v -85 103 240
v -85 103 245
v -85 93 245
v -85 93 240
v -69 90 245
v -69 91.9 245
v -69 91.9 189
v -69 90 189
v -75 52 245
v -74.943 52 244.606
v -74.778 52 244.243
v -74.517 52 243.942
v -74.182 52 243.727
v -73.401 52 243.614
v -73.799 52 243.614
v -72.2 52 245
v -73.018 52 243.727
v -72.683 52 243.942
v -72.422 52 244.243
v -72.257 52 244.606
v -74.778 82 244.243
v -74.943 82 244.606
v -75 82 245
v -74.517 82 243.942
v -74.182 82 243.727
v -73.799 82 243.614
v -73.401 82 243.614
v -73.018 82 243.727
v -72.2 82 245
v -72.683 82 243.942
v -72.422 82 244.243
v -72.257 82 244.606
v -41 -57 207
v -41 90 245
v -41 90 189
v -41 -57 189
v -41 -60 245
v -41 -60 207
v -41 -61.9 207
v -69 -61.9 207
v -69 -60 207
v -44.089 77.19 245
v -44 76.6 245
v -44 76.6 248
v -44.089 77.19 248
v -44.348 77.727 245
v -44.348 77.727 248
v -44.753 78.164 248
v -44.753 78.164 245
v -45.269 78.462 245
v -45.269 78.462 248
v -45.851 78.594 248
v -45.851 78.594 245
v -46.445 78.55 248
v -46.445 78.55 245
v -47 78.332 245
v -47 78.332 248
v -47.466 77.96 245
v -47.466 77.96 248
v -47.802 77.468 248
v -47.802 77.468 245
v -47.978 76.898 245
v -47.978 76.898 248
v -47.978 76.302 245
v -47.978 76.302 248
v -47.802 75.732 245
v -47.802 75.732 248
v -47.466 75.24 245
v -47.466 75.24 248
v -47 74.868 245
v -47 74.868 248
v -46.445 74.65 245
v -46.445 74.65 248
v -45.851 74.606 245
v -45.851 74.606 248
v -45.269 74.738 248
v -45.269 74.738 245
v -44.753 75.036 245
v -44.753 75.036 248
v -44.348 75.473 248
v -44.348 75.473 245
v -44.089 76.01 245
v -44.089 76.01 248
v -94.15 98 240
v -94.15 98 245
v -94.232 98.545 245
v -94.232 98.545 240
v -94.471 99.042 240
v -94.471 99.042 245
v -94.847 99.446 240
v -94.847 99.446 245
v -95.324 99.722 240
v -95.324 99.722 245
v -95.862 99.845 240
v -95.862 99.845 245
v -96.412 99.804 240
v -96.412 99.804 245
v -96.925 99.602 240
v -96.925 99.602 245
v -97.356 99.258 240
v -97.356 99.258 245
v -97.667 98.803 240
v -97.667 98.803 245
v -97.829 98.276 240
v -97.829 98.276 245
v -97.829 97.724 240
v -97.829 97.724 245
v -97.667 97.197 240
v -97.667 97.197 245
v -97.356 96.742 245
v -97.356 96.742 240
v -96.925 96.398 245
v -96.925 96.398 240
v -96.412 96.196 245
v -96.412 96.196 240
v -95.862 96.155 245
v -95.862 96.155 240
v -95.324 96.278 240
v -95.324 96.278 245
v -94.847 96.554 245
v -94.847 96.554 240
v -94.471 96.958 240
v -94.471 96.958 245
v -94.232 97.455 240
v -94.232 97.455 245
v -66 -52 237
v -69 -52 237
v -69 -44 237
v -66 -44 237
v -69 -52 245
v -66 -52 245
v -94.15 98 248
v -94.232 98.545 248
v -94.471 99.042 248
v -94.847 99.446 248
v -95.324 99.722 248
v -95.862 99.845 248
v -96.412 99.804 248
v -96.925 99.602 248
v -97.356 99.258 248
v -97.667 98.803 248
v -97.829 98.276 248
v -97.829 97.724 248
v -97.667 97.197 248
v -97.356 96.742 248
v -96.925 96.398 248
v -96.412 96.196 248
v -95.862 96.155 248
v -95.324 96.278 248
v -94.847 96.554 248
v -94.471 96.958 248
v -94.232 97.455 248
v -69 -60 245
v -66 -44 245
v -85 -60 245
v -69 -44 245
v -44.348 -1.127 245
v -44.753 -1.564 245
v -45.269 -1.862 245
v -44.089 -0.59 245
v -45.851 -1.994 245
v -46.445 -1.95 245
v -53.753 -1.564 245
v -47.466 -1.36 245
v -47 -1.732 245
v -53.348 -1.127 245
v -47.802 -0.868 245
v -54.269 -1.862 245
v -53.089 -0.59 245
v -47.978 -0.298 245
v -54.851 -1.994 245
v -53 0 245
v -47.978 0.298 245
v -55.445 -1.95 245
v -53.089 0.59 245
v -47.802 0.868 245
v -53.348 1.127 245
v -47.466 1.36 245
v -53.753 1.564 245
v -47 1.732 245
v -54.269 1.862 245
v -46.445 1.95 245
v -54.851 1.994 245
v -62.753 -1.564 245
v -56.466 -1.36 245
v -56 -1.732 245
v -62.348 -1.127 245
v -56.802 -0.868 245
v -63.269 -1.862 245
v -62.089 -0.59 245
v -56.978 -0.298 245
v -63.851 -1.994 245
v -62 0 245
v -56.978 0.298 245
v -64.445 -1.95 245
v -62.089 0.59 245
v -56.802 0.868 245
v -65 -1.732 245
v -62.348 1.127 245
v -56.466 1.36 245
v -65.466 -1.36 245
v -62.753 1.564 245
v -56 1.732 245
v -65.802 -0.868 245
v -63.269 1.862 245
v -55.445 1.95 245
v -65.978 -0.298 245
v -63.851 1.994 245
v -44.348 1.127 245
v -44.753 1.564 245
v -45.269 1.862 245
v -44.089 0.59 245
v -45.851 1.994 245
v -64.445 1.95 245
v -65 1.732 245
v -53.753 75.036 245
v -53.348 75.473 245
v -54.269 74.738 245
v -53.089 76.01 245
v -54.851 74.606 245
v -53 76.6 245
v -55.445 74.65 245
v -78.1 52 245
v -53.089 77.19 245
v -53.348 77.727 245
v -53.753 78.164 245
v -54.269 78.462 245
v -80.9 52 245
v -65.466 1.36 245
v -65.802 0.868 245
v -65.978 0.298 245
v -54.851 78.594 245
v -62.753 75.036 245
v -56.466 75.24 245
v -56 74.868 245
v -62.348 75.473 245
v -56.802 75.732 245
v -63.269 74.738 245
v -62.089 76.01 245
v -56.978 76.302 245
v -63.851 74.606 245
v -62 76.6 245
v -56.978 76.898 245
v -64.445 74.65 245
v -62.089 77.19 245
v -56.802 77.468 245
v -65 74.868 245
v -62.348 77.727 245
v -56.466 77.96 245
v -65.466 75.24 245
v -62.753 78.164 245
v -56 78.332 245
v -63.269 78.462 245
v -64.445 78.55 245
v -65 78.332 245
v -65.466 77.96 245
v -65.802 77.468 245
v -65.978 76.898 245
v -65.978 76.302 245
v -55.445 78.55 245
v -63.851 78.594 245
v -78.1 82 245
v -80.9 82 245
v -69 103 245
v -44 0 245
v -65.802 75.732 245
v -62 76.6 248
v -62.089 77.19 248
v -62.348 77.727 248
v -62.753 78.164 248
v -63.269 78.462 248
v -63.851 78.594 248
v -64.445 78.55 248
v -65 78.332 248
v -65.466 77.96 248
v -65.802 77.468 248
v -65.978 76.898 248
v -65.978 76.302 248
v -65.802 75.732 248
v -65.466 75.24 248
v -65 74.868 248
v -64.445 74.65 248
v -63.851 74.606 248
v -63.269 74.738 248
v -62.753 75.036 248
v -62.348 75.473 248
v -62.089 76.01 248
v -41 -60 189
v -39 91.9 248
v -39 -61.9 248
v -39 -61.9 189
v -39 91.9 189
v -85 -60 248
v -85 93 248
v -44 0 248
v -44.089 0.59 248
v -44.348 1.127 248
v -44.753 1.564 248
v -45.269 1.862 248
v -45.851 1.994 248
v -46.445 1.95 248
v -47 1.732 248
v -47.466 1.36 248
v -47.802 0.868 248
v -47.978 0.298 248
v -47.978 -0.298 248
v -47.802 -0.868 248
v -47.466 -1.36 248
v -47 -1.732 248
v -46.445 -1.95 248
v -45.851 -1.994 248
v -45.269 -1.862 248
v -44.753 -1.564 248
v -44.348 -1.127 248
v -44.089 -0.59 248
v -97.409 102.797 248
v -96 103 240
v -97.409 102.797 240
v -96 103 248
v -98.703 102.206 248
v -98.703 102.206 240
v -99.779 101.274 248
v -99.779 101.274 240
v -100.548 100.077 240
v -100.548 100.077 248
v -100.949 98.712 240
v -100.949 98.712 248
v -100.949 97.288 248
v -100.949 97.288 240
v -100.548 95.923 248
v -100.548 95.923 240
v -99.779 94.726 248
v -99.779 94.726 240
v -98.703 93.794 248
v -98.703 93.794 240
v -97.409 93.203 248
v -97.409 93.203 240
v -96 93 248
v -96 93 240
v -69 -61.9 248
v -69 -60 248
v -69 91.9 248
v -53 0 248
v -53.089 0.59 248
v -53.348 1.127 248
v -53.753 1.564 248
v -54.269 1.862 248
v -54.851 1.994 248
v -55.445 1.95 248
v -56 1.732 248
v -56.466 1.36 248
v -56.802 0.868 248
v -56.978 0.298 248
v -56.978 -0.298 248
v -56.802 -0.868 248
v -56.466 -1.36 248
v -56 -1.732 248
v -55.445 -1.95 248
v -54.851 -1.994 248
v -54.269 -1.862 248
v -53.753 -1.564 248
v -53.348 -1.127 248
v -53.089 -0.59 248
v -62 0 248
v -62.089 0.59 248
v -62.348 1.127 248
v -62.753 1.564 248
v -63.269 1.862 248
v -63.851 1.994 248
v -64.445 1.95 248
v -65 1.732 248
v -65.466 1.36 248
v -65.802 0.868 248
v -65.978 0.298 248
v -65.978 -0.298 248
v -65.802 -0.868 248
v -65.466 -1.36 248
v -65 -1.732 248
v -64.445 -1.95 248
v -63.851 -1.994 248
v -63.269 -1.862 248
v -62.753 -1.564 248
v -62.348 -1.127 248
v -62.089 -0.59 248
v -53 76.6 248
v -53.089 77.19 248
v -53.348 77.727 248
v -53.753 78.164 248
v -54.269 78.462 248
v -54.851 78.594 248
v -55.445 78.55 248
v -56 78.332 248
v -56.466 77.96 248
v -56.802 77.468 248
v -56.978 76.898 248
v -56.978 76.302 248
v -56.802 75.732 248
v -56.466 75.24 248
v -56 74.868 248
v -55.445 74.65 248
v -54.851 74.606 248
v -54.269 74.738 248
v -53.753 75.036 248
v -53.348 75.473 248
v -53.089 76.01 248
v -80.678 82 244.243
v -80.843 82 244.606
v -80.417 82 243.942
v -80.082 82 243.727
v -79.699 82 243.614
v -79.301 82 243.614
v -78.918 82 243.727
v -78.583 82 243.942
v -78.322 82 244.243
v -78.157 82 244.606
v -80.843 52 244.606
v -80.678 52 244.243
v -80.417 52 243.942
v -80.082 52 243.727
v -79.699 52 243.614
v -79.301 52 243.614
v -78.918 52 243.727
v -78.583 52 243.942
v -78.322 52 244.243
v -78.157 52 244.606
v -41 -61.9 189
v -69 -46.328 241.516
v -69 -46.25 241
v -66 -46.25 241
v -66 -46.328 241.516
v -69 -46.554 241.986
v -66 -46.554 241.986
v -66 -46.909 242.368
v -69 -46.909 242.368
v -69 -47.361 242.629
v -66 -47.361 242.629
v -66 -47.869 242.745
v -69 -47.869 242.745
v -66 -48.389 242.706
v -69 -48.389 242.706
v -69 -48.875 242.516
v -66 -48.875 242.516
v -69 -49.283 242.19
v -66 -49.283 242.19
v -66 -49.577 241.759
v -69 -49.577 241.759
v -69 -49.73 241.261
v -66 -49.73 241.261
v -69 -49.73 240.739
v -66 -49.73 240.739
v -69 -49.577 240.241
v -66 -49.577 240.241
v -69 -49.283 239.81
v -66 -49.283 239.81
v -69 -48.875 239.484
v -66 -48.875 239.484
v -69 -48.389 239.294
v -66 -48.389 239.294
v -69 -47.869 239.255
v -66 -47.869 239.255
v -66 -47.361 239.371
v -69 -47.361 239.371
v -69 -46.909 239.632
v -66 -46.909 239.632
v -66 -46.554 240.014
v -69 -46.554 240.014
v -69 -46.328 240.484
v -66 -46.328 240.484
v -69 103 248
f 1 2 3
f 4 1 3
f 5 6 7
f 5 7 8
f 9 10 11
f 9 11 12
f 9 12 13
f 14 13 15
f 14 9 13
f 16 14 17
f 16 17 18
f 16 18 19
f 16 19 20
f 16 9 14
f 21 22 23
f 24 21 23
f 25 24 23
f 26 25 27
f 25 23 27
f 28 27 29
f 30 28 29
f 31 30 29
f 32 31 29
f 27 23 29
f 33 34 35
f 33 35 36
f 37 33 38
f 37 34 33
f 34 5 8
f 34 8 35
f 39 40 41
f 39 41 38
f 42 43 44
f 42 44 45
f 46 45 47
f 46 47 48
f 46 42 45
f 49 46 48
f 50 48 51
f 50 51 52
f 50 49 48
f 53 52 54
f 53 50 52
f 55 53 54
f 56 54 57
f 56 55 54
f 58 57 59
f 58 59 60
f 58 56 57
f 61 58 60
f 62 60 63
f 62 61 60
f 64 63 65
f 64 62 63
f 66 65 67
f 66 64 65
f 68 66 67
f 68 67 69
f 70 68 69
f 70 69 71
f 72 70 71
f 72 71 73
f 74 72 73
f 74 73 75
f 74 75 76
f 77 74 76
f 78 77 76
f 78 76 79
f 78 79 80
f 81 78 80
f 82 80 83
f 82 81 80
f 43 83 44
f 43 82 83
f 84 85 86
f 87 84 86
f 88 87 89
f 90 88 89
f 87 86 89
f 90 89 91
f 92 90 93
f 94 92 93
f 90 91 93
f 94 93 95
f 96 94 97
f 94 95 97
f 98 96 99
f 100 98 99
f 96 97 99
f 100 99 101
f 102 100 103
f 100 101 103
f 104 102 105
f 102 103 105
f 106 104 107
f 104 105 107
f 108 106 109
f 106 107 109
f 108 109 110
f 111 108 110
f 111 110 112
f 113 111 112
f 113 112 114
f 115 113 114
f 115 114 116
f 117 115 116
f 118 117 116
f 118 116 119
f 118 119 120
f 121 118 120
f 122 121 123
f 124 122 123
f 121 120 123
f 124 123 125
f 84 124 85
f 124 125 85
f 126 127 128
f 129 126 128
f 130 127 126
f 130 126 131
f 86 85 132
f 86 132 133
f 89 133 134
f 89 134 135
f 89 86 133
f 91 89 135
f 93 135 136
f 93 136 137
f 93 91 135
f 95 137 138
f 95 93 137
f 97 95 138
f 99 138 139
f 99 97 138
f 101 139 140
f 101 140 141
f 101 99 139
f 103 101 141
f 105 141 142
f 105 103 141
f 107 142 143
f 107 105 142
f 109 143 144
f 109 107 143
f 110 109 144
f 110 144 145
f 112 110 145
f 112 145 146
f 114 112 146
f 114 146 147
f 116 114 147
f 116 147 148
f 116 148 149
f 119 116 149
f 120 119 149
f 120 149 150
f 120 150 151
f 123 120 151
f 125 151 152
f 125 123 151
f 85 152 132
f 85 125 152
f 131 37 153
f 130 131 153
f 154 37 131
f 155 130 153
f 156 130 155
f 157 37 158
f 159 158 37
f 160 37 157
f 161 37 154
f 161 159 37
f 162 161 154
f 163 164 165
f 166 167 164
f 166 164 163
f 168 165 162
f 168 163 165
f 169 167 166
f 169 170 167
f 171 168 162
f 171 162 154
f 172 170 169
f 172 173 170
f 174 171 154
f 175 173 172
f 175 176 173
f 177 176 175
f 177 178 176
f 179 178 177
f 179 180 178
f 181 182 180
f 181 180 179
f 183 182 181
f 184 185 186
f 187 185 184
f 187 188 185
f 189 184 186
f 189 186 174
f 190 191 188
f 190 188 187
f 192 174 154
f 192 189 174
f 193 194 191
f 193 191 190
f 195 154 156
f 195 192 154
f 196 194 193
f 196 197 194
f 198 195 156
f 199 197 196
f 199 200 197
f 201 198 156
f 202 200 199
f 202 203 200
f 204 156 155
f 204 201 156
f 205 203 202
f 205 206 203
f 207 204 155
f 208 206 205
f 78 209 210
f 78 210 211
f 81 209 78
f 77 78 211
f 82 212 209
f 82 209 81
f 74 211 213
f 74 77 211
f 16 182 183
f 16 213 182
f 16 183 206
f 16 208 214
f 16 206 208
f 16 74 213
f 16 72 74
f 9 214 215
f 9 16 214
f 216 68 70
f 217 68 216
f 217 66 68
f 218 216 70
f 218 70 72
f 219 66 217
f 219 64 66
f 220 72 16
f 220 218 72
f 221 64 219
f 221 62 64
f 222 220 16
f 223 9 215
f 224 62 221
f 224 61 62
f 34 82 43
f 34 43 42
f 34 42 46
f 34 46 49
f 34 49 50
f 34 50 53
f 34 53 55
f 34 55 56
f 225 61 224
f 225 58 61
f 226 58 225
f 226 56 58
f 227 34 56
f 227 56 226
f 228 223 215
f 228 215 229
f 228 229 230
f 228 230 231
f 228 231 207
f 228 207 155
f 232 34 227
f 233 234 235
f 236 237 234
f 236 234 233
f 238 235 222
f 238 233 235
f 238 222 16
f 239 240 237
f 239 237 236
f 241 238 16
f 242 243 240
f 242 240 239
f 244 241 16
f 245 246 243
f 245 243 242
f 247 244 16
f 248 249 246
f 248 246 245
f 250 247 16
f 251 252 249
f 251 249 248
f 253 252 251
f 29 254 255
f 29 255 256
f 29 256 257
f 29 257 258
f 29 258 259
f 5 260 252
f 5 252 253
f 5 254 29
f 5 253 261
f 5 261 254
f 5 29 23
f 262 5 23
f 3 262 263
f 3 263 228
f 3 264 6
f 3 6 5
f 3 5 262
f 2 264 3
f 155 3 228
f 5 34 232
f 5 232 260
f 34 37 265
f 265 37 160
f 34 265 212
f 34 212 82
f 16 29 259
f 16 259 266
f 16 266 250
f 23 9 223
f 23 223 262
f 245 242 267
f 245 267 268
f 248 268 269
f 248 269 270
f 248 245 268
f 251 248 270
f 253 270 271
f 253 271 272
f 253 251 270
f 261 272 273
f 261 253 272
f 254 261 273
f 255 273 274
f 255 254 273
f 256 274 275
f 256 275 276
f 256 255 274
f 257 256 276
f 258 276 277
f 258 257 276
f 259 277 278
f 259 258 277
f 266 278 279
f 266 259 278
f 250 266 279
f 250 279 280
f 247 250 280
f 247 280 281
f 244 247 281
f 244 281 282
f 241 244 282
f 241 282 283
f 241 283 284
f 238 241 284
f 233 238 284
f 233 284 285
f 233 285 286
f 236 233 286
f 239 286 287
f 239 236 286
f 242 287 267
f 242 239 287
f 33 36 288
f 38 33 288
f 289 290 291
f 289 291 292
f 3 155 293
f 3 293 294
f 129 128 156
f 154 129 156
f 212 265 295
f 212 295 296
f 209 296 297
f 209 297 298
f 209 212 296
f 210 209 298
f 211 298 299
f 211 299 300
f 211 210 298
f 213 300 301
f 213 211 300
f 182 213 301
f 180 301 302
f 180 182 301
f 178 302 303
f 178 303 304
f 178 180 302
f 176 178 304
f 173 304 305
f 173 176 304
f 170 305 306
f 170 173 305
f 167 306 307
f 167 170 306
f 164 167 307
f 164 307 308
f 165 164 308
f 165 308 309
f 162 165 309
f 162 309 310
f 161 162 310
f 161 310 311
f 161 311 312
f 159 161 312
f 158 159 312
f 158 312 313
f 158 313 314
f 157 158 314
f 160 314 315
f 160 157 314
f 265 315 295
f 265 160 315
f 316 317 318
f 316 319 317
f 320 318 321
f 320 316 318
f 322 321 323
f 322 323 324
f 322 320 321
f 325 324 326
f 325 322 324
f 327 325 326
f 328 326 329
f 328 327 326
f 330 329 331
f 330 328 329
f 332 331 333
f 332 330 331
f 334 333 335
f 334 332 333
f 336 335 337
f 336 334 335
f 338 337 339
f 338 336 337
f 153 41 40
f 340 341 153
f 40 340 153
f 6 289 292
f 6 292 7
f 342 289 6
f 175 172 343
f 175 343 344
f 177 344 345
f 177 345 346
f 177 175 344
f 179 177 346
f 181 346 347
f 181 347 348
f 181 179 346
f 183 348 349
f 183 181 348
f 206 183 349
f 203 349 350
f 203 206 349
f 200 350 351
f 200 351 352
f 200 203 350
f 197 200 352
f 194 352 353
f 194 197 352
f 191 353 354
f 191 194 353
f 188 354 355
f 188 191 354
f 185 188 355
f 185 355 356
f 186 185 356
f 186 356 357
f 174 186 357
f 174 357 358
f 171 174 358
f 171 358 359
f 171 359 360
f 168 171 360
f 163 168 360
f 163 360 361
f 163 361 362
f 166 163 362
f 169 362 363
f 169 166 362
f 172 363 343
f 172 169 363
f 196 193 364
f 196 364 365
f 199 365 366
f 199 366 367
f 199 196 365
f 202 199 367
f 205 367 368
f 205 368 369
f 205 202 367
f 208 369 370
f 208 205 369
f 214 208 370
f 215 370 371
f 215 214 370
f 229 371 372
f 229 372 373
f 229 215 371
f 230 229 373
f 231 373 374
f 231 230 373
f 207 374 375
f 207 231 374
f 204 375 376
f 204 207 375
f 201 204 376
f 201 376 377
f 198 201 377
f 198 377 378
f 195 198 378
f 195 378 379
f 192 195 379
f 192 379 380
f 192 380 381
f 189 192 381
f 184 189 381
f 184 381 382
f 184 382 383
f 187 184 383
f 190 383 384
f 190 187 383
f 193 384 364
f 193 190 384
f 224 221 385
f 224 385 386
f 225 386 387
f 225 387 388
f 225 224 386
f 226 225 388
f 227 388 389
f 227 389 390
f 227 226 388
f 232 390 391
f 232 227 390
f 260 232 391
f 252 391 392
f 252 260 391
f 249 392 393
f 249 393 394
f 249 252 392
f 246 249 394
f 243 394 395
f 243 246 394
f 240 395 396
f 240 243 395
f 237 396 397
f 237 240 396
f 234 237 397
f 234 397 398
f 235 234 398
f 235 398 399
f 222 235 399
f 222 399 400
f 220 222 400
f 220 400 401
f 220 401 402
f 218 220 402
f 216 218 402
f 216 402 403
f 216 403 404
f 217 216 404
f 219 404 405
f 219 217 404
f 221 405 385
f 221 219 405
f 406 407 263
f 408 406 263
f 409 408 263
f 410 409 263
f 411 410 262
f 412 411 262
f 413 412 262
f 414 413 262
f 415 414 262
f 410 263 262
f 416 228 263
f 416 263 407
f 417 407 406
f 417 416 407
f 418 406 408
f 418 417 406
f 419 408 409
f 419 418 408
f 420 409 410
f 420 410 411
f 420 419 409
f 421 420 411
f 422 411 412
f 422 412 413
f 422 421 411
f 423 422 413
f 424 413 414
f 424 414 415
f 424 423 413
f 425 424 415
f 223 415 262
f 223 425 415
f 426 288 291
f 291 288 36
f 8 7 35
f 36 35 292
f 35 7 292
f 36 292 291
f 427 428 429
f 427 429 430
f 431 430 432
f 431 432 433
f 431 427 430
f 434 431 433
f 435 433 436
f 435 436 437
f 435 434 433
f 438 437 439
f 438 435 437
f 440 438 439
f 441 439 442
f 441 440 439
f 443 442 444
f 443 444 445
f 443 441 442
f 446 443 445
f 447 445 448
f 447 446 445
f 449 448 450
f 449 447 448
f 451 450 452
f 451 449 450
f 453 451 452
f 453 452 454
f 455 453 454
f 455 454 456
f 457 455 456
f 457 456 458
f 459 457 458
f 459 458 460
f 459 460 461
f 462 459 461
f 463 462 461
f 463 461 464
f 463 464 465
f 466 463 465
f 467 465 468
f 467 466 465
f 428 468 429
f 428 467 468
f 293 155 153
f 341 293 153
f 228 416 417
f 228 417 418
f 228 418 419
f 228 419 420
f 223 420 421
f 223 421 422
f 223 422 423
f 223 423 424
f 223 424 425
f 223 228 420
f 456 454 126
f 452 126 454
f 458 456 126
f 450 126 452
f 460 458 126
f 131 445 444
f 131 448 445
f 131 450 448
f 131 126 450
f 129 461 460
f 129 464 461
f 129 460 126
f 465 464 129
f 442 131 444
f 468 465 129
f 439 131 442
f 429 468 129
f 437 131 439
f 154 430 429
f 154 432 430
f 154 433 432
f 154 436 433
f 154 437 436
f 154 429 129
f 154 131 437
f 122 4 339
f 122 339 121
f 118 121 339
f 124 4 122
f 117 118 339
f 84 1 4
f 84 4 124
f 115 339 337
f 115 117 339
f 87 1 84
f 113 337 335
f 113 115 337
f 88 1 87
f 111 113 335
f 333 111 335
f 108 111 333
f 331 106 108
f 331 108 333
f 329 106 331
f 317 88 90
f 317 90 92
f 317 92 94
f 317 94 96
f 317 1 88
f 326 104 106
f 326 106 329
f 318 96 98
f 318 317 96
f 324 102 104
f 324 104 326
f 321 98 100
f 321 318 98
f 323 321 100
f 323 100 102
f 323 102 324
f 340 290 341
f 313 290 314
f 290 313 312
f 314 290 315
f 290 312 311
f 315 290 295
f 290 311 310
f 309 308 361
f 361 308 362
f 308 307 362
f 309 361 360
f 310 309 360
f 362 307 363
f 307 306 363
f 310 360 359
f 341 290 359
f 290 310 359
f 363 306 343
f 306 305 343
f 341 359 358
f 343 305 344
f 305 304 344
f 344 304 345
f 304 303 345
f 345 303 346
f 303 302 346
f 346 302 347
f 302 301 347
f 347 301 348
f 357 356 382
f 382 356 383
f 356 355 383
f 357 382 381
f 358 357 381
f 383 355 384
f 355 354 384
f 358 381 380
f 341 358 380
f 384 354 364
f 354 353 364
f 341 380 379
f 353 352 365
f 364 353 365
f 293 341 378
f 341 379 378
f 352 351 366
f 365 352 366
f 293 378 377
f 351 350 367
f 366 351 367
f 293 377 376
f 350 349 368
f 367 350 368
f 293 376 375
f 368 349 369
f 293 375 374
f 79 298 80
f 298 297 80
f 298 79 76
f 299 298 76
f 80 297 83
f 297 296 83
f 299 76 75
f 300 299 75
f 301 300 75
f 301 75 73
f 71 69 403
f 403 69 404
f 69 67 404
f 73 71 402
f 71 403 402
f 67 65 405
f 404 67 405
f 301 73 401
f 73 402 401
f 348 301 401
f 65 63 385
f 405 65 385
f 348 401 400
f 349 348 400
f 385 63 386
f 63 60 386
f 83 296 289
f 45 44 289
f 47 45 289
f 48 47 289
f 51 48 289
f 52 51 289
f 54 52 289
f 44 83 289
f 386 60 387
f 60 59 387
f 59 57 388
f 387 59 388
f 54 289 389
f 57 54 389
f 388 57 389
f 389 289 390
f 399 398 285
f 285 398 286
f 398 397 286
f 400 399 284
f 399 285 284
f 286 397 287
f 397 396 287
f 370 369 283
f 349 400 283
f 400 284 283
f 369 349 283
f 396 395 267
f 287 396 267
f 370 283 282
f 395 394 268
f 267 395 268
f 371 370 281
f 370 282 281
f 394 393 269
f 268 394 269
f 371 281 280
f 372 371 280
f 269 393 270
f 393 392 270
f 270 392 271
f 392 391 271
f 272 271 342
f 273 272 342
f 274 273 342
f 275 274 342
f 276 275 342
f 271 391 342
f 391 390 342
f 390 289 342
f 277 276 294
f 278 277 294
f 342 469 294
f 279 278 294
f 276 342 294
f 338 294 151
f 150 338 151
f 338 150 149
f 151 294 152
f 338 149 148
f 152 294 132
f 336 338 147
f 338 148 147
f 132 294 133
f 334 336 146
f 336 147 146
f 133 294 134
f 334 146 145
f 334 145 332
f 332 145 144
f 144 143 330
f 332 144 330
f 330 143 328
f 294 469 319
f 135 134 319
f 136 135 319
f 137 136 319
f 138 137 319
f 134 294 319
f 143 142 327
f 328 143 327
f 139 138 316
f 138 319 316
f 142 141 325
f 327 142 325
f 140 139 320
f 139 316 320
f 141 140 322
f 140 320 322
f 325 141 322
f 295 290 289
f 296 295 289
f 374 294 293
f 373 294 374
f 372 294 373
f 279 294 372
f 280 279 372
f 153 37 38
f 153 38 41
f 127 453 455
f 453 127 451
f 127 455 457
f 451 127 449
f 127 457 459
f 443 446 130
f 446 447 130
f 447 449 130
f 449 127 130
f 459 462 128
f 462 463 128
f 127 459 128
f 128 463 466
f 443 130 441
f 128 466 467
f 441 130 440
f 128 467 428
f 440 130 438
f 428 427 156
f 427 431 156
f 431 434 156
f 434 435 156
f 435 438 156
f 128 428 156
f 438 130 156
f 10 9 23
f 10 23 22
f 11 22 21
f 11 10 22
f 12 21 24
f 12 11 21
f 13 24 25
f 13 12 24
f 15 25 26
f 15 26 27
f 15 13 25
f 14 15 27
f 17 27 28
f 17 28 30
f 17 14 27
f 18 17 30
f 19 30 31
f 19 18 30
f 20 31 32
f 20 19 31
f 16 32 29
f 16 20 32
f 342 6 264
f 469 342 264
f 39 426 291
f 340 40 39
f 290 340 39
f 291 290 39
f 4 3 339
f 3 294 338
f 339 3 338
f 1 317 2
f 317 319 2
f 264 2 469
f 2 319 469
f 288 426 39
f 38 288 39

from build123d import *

# Parameters (mm, degrees)
SKETCH250_W       = 8
SKETCH250_H       = 8
SKETCH250_R       = 1.75
PAD023_DEPTH      = 3
SKETCH252_W       = 44
SKETCH252_H       = 150
SKETCH252_R       = 2
PAD024_DEPTH      = 3
PAD025_DEPTH      = 59
PAD026_DEPTH      = 30
SKETCH255_W       = 16
SKETCH255_H       = 13
PAD027_DEPTH      = 3
SKETCH256_R       = 1.85
PAD028_DEPTH      = 3
PAD028_DEPTH_BACK = 5
SKETCH257_W       = 32
SKETCH257_H       = 19
POCKET018_DEPTH   = 5


with BuildPart() as part:
    # Sketch250 → Pad023 (new body)
    with BuildSketch(Plane.YZ):
        Rectangle(SKETCH250_W, SKETCH250_H)
        Circle(SKETCH250_R, mode=Mode.SUBTRACT)
    extrude(amount=PAD023_DEPTH)

    # Sketch252 → Pad024 (join)
    with BuildSketch(Plane.XY.offset(4)):
        with Locations((6, 63)):
            Rectangle(SKETCH252_W, SKETCH252_H)
        with Locations((5, 48)):
            Circle(SKETCH252_R, mode=Mode.SUBTRACT)
        with Locations((14, 48)):
            Circle(SKETCH252_R, mode=Mode.SUBTRACT)
        with Locations((23, 48)):
            Circle(SKETCH252_R, mode=Mode.SUBTRACT)
        with Locations((23, 124.6)):
            Circle(SKETCH252_R, mode=Mode.SUBTRACT)
        with Locations((14, 124.6)):
            Circle(SKETCH252_R, mode=Mode.SUBTRACT)
        with Locations((5, 124.6)):
            Circle(SKETCH252_R, mode=Mode.SUBTRACT)
    extrude(amount=PAD024_DEPTH)

    # Sketch253 → Pad025 (join)
    with BuildSketch(Plane.XY.offset(7)):
        Polygon((0, 139.9), (0, 138), (28, 138), (28, -12), (0, -12), (0, -13.9), (30, -13.9), (30, 139.9), align=None)
    extrude(amount=-PAD025_DEPTH)

    # Sketch254 → Pad026 (join)
    with BuildSketch(Plane.XZ.offset(-100)):
        with BuildLine():
            ThreePointArc((-6, 4), (-4.6, 2.6), (-3.2, 4))
            Line((-6, 4), (-3.2, 4))
        make_face()
        with BuildLine():
            ThreePointArc((-11.9, 4), (-10.5, 2.6), (-9.1, 4))
            Line((-11.9, 4), (-9.1, 4))
        make_face()
    extrude(amount=-PAD026_DEPTH)

    # Sketch255 → Pad027 (join)
    with BuildSketch(Plane.XY.offset(4)):
        with Locations((-8, 144.5)):
            Rectangle(SKETCH255_W, SKETCH255_H)
    extrude(amount=PAD027_DEPTH)

    # Sketch256 → Pad028 (join, two sides)
    with BuildSketch(Plane.XY.offset(4)) as pad028_sk:
        with BuildLine():
            Line((-16, 141), (-27, 141))
            ThreePointArc((-27, 151), (-32, 146), (-27, 141))
            Line((-27, 151), (-16, 151))
            Line((-16, 151), (-16, 141))
        make_face()
        with Locations((-27, 146)):
            Circle(SKETCH256_R, mode=Mode.SUBTRACT)
    extrude(amount=PAD028_DEPTH)
    extrude(pad028_sk.sketch, amount=-PAD028_DEPTH_BACK)

    # Sketch257 → Pocket018 (cut)
    with BuildSketch(Plane.XZ.offset(14)):
        with Locations((12, -43.5)):
            Rectangle(SKETCH257_W, SKETCH257_H)
    extrude(amount=-POCKET018_DEPTH, mode=Mode.SUBTRACT)


with BuildPart() as part_1:
    # Body012 placement: moved
    add(part.part.moved(Location((-69, -48, 241))))


solid = part_1.part
